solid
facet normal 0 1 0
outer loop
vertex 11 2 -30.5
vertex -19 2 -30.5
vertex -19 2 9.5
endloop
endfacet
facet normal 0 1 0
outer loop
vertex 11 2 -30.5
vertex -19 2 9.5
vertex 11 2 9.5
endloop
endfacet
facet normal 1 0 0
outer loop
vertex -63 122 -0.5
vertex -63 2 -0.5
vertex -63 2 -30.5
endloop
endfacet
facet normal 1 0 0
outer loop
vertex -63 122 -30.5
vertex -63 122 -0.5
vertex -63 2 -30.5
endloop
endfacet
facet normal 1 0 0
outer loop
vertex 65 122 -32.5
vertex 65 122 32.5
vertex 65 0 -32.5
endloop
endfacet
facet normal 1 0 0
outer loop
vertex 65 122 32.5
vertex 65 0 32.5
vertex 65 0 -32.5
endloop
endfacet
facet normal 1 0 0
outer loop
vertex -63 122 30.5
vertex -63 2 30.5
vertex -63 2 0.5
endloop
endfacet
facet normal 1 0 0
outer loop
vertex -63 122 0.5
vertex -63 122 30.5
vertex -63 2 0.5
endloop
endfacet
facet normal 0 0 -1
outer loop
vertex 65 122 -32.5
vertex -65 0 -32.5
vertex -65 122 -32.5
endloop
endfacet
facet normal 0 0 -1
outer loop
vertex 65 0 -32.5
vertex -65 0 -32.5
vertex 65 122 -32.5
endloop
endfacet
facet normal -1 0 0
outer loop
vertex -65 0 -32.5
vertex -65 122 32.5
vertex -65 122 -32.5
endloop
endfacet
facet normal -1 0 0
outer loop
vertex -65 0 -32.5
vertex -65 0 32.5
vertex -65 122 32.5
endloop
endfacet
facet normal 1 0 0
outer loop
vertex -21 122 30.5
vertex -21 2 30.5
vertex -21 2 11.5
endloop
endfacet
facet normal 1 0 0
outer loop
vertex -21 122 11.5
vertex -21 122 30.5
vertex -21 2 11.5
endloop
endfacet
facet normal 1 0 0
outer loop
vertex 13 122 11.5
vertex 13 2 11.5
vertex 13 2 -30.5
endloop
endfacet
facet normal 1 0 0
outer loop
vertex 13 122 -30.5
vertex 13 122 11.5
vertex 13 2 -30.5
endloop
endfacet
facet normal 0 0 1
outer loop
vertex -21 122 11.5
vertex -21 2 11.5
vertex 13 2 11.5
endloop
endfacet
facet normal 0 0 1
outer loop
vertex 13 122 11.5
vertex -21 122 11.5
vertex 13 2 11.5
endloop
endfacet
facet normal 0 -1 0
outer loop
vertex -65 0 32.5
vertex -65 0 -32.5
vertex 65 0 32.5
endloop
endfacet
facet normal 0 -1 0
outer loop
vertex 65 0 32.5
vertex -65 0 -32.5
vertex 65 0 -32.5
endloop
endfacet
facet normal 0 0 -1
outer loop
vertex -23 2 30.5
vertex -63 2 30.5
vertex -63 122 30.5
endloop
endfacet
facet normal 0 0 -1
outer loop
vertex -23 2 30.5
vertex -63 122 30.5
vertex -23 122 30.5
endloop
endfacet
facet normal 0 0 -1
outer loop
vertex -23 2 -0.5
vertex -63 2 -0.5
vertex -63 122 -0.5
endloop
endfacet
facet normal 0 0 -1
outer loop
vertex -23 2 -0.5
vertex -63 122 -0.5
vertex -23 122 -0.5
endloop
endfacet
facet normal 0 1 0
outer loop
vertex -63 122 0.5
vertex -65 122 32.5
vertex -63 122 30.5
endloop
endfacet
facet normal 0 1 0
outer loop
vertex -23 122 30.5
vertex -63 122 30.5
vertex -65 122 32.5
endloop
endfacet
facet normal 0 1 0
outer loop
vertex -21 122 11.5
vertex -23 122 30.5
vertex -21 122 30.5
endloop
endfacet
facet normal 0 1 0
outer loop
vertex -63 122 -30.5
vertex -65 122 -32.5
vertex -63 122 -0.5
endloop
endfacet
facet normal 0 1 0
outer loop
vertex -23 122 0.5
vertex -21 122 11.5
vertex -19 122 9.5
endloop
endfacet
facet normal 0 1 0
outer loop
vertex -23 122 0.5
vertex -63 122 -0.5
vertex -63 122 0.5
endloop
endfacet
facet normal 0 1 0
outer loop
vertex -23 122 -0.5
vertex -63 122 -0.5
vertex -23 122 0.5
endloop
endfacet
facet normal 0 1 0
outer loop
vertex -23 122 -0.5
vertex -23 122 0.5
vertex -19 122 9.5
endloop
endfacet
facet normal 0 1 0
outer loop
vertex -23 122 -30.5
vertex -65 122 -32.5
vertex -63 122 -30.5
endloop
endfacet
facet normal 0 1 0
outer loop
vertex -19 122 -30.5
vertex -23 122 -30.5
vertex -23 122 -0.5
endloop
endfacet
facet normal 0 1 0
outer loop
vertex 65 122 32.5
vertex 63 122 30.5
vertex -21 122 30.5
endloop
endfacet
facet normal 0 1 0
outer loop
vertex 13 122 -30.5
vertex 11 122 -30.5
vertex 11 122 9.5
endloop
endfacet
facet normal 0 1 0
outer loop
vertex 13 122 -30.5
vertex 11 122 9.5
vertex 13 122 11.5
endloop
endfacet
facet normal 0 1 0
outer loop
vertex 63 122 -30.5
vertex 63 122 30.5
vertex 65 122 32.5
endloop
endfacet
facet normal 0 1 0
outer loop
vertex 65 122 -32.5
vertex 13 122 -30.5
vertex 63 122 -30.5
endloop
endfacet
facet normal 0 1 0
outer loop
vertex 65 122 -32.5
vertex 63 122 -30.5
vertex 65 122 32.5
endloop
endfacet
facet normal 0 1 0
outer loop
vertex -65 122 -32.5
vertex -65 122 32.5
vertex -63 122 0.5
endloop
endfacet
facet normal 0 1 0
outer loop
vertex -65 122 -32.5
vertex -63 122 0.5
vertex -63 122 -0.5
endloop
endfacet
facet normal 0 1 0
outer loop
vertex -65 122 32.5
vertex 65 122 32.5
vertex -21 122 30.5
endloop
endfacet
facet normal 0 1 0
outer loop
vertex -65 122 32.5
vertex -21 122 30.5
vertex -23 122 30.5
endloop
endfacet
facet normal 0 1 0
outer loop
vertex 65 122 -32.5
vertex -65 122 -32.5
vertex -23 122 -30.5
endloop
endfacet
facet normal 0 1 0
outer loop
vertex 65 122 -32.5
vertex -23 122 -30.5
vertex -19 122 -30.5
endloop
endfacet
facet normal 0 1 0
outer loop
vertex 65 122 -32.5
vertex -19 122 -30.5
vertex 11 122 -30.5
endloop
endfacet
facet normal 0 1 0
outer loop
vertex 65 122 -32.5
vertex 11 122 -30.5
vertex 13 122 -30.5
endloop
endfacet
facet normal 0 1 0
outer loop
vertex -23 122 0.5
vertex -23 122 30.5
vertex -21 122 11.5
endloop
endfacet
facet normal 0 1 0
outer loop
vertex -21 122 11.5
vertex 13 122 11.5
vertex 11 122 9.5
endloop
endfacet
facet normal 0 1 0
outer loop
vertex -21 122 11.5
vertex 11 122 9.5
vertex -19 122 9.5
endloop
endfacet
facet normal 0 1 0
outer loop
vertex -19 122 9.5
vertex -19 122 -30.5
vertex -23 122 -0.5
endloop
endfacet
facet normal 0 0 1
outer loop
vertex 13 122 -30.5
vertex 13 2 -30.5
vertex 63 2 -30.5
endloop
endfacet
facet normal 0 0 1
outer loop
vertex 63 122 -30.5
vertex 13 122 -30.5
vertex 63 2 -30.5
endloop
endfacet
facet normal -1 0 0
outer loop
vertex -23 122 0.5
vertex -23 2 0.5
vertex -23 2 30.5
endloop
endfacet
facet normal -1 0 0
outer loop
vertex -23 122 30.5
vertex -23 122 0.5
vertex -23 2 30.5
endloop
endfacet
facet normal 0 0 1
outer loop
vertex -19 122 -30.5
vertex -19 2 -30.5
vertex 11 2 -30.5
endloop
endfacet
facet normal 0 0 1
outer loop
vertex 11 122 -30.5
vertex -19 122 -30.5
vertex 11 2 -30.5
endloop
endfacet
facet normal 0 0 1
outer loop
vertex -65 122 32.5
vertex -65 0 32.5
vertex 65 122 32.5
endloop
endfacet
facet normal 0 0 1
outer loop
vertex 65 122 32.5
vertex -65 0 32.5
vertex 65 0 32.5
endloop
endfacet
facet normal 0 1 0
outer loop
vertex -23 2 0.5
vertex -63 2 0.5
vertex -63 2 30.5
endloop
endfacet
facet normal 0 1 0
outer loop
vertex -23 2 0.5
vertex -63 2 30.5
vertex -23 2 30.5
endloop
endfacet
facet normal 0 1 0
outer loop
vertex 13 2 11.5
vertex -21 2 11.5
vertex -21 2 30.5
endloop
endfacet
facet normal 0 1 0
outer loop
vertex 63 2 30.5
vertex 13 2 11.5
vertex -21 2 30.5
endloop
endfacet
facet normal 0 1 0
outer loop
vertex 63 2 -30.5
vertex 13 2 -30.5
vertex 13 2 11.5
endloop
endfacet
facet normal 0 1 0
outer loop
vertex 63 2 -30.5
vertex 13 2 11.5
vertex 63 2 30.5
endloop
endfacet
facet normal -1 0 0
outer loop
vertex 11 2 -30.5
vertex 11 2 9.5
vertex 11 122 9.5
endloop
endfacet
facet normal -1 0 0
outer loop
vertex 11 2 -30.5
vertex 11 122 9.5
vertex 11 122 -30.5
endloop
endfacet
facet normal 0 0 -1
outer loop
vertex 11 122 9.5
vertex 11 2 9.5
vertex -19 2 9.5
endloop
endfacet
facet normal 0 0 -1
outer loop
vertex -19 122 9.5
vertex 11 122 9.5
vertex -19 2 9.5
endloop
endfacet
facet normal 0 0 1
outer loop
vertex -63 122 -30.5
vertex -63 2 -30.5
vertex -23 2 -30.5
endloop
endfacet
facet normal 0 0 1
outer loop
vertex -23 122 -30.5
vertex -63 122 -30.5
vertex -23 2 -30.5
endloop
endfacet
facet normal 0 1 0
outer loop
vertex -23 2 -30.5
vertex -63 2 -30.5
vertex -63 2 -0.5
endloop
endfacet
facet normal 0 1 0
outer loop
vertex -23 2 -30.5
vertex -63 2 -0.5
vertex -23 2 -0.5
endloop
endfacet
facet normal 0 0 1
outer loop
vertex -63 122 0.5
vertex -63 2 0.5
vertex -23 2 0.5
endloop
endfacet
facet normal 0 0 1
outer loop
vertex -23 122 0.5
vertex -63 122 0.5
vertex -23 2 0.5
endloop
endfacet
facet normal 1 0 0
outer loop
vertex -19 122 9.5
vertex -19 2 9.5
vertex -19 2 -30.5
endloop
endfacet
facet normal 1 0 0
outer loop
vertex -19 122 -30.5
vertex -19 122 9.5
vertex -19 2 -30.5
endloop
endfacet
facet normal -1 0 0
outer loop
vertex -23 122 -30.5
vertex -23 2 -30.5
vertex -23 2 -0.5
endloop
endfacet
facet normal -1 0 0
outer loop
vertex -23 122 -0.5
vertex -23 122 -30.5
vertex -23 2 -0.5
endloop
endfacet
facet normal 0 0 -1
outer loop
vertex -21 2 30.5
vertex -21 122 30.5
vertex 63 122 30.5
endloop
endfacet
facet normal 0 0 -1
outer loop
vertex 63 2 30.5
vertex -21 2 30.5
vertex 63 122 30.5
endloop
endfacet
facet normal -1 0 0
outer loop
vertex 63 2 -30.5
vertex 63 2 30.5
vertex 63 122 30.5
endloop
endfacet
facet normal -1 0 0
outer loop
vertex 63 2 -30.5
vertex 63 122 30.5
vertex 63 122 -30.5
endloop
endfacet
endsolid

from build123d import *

# Parameters (mm, degrees)
SKETCH1_W           = 130
SKETCH1_H           = 65
BOSS_EXTRUDE1_DEPTH = 2
SKETCH2_W           = 130
SKETCH2_H           = 65
SKETCH2_W_2         = 126
SKETCH2_H_2         = 61
BOSS_EXTRUDE2_DEPTH = 120
SKETCH4_W           = 40
SKETCH4_H           = 1
SKETCH4_W_2         = 2
SKETCH4_H_2         = 19
SKETCH4_H_3         = 40
BOSS_EXTRUDE3_DEPTH = 120


with BuildPart() as part:
    # Sketch1 → Boss-Extrude1 (new body)
    with BuildSketch(Plane(origin=(0, 0, 0), x_dir=(1, 0, 0), z_dir=(0, 1, 0))):
        Rectangle(SKETCH1_W, SKETCH1_H)
    extrude(amount=BOSS_EXTRUDE1_DEPTH)

    # Sketch2 → Boss-Extrude2 (add)
    with BuildSketch(Plane(origin=(0, 2, 0), x_dir=(1, 0, 0), z_dir=(0, 1, 0))):
        Rectangle(SKETCH2_W, SKETCH2_H)
        Rectangle(SKETCH2_W_2, SKETCH2_H_2, mode=Mode.SUBTRACT)
    extrude(amount=BOSS_EXTRUDE2_DEPTH)

    # Sketch4 → Boss-Extrude3 (add)
    with BuildSketch(Plane(origin=(0, 2, 0), x_dir=(1, 0, 0), z_dir=(0, 1, 0))):
        Polygon((-21, 30.5), (-23, 30.5), (-23, 0.5), (-23, -0.5), (-23, -9.5), (-19, -9.5), (-19, 30.5), align=None)
        with Locations((-43, 0)):
            Rectangle(SKETCH4_W, SKETCH4_H)
        with Locations((-22, -21)):
            Rectangle(SKETCH4_W_2, SKETCH4_H_2)
        Polygon((11, -9.5), (-19, -9.5), (-23, -9.5), (-23, -11.5), (-21, -11.5), (13, -11.5), (13, -9.5), align=None)
        with Locations((12, 10.5)):
            Rectangle(SKETCH4_W_2, SKETCH4_H_3)
    extrude(amount=BOSS_EXTRUDE3_DEPTH)


solid = part.part
